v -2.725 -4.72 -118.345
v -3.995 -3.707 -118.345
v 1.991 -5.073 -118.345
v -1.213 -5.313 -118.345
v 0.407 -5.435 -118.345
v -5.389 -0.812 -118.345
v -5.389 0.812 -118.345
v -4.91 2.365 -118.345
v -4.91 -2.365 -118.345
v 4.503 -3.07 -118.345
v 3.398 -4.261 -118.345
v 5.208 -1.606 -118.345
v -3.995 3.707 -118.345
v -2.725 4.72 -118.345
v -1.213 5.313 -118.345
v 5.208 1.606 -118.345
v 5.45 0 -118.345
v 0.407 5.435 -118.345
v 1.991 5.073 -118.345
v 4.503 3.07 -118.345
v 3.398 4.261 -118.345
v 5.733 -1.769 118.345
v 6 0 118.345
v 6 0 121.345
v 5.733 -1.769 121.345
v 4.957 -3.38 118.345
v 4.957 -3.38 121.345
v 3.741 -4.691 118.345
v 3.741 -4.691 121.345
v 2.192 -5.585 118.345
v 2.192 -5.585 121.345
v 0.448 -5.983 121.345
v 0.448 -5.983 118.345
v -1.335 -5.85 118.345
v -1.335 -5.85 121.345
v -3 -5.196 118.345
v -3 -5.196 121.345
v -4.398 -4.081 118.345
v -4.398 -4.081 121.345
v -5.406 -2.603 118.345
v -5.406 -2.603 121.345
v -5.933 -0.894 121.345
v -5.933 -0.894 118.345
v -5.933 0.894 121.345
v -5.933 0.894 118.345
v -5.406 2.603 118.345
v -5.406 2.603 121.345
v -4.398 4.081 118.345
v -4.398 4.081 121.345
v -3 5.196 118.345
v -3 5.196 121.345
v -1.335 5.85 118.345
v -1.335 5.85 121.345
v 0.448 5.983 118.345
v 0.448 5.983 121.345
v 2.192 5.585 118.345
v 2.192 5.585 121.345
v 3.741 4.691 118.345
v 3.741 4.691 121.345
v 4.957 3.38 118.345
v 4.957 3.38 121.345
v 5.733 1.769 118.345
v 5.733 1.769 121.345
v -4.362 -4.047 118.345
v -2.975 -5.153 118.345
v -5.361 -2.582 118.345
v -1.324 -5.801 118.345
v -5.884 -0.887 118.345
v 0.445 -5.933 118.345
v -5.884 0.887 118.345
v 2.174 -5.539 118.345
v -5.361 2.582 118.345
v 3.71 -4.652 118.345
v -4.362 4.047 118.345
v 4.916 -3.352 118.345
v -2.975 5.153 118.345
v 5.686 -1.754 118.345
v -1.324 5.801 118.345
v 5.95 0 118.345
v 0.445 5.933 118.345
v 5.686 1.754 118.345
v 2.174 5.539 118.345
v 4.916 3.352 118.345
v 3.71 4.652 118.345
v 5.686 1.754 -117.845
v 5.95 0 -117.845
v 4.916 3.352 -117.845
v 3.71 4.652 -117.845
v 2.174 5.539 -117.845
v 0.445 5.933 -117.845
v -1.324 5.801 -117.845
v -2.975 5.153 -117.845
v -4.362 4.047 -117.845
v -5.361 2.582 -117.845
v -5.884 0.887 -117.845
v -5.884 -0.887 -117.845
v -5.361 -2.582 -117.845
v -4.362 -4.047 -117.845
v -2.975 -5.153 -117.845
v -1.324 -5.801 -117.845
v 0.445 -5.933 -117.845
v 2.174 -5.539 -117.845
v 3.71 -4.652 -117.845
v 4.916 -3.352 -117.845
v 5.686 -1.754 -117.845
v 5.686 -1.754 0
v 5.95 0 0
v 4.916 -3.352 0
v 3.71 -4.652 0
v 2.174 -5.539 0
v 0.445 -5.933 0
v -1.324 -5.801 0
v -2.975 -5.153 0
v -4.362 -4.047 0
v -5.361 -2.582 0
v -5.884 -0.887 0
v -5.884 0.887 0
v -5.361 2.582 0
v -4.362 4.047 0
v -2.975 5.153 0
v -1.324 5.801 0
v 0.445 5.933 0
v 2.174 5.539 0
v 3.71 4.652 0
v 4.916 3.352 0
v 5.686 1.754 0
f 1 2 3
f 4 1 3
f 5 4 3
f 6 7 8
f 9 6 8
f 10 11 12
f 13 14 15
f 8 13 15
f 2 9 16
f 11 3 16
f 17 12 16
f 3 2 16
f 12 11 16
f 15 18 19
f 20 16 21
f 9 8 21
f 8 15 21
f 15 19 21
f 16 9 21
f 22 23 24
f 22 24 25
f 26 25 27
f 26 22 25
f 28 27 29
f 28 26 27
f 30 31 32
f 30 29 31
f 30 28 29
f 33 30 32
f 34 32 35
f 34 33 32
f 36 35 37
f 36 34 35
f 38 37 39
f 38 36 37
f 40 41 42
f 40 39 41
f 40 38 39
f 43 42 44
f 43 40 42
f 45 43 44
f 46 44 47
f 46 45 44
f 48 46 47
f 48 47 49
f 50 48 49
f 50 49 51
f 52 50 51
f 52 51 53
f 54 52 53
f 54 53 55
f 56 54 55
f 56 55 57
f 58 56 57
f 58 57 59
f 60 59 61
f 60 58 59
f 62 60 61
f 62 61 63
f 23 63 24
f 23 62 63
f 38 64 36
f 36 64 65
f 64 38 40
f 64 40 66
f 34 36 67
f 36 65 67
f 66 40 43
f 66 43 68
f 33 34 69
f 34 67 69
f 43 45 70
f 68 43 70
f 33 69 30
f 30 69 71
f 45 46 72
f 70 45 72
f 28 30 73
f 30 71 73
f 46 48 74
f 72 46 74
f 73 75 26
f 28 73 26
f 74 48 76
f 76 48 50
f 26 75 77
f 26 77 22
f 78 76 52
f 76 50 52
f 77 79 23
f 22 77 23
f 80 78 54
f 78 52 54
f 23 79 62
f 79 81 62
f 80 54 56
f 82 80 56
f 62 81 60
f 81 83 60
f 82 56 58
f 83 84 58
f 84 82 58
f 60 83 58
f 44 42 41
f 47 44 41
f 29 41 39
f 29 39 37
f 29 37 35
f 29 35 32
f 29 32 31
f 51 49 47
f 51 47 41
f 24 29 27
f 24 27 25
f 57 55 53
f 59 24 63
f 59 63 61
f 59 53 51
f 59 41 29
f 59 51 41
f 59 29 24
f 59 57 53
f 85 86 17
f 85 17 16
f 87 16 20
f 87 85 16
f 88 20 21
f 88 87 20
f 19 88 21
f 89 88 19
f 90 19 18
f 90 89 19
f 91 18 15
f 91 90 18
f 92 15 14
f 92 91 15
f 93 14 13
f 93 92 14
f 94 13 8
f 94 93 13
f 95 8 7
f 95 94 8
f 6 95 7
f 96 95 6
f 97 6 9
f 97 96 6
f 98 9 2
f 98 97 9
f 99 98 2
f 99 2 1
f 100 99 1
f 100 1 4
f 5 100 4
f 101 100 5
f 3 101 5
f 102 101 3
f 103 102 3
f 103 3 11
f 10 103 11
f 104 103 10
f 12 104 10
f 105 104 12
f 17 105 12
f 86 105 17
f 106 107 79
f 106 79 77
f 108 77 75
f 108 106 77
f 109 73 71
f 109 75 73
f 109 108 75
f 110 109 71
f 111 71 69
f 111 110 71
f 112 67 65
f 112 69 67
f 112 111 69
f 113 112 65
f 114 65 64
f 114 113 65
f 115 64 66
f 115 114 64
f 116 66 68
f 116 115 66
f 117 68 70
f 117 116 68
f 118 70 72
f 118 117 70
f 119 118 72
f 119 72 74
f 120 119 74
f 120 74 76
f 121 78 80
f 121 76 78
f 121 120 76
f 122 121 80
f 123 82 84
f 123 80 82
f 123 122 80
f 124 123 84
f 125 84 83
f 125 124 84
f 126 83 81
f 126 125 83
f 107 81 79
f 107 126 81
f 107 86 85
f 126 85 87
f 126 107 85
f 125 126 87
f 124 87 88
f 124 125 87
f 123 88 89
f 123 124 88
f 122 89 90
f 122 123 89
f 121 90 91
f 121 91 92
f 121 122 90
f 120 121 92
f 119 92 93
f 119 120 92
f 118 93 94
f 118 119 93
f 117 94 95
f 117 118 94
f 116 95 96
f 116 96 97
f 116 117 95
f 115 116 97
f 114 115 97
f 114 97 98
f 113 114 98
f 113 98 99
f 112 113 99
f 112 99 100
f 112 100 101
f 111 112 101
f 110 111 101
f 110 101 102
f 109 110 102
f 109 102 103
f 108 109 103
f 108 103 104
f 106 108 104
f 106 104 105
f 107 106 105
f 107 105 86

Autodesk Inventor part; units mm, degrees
ref_plane "YZ Plane" through (0, 0, 0) normal (1, 0, 0) x (0, 1, 0)
ref_plane "XZ Plane" through (0, 0, 0) normal (0, 1, 0) x (-1, 0, 0)
ref_plane "XY Plane" through (0, 0, 0) normal (0, 0, 1) x (1, 0, 0)
sketch "Sketch1" plane through (0, 0, 0) normal (0, 0, 1) x (1, 0, 0)
  circle A0 centre (0, 0) radius 5.95
  dimension "d1" = 11.9
extrude "Extrusion1" add sketch "Sketch1" along normal mid plane 236.69
chamfer "Chamfer3" distance 0.5 angle 45 1 edges at (-5.95, 0, -118.345)
sketch "Sketch4" plane through (0, 0, 118.345) normal (0, 0, 1) x (1, 0, 0)
  circle A0 centre (0, 0) radius 6
extrude "Extrusion5" add sketch "Sketch4" along normal blind 3
properties part number "Plate Support" material "Aluminum 6061"
